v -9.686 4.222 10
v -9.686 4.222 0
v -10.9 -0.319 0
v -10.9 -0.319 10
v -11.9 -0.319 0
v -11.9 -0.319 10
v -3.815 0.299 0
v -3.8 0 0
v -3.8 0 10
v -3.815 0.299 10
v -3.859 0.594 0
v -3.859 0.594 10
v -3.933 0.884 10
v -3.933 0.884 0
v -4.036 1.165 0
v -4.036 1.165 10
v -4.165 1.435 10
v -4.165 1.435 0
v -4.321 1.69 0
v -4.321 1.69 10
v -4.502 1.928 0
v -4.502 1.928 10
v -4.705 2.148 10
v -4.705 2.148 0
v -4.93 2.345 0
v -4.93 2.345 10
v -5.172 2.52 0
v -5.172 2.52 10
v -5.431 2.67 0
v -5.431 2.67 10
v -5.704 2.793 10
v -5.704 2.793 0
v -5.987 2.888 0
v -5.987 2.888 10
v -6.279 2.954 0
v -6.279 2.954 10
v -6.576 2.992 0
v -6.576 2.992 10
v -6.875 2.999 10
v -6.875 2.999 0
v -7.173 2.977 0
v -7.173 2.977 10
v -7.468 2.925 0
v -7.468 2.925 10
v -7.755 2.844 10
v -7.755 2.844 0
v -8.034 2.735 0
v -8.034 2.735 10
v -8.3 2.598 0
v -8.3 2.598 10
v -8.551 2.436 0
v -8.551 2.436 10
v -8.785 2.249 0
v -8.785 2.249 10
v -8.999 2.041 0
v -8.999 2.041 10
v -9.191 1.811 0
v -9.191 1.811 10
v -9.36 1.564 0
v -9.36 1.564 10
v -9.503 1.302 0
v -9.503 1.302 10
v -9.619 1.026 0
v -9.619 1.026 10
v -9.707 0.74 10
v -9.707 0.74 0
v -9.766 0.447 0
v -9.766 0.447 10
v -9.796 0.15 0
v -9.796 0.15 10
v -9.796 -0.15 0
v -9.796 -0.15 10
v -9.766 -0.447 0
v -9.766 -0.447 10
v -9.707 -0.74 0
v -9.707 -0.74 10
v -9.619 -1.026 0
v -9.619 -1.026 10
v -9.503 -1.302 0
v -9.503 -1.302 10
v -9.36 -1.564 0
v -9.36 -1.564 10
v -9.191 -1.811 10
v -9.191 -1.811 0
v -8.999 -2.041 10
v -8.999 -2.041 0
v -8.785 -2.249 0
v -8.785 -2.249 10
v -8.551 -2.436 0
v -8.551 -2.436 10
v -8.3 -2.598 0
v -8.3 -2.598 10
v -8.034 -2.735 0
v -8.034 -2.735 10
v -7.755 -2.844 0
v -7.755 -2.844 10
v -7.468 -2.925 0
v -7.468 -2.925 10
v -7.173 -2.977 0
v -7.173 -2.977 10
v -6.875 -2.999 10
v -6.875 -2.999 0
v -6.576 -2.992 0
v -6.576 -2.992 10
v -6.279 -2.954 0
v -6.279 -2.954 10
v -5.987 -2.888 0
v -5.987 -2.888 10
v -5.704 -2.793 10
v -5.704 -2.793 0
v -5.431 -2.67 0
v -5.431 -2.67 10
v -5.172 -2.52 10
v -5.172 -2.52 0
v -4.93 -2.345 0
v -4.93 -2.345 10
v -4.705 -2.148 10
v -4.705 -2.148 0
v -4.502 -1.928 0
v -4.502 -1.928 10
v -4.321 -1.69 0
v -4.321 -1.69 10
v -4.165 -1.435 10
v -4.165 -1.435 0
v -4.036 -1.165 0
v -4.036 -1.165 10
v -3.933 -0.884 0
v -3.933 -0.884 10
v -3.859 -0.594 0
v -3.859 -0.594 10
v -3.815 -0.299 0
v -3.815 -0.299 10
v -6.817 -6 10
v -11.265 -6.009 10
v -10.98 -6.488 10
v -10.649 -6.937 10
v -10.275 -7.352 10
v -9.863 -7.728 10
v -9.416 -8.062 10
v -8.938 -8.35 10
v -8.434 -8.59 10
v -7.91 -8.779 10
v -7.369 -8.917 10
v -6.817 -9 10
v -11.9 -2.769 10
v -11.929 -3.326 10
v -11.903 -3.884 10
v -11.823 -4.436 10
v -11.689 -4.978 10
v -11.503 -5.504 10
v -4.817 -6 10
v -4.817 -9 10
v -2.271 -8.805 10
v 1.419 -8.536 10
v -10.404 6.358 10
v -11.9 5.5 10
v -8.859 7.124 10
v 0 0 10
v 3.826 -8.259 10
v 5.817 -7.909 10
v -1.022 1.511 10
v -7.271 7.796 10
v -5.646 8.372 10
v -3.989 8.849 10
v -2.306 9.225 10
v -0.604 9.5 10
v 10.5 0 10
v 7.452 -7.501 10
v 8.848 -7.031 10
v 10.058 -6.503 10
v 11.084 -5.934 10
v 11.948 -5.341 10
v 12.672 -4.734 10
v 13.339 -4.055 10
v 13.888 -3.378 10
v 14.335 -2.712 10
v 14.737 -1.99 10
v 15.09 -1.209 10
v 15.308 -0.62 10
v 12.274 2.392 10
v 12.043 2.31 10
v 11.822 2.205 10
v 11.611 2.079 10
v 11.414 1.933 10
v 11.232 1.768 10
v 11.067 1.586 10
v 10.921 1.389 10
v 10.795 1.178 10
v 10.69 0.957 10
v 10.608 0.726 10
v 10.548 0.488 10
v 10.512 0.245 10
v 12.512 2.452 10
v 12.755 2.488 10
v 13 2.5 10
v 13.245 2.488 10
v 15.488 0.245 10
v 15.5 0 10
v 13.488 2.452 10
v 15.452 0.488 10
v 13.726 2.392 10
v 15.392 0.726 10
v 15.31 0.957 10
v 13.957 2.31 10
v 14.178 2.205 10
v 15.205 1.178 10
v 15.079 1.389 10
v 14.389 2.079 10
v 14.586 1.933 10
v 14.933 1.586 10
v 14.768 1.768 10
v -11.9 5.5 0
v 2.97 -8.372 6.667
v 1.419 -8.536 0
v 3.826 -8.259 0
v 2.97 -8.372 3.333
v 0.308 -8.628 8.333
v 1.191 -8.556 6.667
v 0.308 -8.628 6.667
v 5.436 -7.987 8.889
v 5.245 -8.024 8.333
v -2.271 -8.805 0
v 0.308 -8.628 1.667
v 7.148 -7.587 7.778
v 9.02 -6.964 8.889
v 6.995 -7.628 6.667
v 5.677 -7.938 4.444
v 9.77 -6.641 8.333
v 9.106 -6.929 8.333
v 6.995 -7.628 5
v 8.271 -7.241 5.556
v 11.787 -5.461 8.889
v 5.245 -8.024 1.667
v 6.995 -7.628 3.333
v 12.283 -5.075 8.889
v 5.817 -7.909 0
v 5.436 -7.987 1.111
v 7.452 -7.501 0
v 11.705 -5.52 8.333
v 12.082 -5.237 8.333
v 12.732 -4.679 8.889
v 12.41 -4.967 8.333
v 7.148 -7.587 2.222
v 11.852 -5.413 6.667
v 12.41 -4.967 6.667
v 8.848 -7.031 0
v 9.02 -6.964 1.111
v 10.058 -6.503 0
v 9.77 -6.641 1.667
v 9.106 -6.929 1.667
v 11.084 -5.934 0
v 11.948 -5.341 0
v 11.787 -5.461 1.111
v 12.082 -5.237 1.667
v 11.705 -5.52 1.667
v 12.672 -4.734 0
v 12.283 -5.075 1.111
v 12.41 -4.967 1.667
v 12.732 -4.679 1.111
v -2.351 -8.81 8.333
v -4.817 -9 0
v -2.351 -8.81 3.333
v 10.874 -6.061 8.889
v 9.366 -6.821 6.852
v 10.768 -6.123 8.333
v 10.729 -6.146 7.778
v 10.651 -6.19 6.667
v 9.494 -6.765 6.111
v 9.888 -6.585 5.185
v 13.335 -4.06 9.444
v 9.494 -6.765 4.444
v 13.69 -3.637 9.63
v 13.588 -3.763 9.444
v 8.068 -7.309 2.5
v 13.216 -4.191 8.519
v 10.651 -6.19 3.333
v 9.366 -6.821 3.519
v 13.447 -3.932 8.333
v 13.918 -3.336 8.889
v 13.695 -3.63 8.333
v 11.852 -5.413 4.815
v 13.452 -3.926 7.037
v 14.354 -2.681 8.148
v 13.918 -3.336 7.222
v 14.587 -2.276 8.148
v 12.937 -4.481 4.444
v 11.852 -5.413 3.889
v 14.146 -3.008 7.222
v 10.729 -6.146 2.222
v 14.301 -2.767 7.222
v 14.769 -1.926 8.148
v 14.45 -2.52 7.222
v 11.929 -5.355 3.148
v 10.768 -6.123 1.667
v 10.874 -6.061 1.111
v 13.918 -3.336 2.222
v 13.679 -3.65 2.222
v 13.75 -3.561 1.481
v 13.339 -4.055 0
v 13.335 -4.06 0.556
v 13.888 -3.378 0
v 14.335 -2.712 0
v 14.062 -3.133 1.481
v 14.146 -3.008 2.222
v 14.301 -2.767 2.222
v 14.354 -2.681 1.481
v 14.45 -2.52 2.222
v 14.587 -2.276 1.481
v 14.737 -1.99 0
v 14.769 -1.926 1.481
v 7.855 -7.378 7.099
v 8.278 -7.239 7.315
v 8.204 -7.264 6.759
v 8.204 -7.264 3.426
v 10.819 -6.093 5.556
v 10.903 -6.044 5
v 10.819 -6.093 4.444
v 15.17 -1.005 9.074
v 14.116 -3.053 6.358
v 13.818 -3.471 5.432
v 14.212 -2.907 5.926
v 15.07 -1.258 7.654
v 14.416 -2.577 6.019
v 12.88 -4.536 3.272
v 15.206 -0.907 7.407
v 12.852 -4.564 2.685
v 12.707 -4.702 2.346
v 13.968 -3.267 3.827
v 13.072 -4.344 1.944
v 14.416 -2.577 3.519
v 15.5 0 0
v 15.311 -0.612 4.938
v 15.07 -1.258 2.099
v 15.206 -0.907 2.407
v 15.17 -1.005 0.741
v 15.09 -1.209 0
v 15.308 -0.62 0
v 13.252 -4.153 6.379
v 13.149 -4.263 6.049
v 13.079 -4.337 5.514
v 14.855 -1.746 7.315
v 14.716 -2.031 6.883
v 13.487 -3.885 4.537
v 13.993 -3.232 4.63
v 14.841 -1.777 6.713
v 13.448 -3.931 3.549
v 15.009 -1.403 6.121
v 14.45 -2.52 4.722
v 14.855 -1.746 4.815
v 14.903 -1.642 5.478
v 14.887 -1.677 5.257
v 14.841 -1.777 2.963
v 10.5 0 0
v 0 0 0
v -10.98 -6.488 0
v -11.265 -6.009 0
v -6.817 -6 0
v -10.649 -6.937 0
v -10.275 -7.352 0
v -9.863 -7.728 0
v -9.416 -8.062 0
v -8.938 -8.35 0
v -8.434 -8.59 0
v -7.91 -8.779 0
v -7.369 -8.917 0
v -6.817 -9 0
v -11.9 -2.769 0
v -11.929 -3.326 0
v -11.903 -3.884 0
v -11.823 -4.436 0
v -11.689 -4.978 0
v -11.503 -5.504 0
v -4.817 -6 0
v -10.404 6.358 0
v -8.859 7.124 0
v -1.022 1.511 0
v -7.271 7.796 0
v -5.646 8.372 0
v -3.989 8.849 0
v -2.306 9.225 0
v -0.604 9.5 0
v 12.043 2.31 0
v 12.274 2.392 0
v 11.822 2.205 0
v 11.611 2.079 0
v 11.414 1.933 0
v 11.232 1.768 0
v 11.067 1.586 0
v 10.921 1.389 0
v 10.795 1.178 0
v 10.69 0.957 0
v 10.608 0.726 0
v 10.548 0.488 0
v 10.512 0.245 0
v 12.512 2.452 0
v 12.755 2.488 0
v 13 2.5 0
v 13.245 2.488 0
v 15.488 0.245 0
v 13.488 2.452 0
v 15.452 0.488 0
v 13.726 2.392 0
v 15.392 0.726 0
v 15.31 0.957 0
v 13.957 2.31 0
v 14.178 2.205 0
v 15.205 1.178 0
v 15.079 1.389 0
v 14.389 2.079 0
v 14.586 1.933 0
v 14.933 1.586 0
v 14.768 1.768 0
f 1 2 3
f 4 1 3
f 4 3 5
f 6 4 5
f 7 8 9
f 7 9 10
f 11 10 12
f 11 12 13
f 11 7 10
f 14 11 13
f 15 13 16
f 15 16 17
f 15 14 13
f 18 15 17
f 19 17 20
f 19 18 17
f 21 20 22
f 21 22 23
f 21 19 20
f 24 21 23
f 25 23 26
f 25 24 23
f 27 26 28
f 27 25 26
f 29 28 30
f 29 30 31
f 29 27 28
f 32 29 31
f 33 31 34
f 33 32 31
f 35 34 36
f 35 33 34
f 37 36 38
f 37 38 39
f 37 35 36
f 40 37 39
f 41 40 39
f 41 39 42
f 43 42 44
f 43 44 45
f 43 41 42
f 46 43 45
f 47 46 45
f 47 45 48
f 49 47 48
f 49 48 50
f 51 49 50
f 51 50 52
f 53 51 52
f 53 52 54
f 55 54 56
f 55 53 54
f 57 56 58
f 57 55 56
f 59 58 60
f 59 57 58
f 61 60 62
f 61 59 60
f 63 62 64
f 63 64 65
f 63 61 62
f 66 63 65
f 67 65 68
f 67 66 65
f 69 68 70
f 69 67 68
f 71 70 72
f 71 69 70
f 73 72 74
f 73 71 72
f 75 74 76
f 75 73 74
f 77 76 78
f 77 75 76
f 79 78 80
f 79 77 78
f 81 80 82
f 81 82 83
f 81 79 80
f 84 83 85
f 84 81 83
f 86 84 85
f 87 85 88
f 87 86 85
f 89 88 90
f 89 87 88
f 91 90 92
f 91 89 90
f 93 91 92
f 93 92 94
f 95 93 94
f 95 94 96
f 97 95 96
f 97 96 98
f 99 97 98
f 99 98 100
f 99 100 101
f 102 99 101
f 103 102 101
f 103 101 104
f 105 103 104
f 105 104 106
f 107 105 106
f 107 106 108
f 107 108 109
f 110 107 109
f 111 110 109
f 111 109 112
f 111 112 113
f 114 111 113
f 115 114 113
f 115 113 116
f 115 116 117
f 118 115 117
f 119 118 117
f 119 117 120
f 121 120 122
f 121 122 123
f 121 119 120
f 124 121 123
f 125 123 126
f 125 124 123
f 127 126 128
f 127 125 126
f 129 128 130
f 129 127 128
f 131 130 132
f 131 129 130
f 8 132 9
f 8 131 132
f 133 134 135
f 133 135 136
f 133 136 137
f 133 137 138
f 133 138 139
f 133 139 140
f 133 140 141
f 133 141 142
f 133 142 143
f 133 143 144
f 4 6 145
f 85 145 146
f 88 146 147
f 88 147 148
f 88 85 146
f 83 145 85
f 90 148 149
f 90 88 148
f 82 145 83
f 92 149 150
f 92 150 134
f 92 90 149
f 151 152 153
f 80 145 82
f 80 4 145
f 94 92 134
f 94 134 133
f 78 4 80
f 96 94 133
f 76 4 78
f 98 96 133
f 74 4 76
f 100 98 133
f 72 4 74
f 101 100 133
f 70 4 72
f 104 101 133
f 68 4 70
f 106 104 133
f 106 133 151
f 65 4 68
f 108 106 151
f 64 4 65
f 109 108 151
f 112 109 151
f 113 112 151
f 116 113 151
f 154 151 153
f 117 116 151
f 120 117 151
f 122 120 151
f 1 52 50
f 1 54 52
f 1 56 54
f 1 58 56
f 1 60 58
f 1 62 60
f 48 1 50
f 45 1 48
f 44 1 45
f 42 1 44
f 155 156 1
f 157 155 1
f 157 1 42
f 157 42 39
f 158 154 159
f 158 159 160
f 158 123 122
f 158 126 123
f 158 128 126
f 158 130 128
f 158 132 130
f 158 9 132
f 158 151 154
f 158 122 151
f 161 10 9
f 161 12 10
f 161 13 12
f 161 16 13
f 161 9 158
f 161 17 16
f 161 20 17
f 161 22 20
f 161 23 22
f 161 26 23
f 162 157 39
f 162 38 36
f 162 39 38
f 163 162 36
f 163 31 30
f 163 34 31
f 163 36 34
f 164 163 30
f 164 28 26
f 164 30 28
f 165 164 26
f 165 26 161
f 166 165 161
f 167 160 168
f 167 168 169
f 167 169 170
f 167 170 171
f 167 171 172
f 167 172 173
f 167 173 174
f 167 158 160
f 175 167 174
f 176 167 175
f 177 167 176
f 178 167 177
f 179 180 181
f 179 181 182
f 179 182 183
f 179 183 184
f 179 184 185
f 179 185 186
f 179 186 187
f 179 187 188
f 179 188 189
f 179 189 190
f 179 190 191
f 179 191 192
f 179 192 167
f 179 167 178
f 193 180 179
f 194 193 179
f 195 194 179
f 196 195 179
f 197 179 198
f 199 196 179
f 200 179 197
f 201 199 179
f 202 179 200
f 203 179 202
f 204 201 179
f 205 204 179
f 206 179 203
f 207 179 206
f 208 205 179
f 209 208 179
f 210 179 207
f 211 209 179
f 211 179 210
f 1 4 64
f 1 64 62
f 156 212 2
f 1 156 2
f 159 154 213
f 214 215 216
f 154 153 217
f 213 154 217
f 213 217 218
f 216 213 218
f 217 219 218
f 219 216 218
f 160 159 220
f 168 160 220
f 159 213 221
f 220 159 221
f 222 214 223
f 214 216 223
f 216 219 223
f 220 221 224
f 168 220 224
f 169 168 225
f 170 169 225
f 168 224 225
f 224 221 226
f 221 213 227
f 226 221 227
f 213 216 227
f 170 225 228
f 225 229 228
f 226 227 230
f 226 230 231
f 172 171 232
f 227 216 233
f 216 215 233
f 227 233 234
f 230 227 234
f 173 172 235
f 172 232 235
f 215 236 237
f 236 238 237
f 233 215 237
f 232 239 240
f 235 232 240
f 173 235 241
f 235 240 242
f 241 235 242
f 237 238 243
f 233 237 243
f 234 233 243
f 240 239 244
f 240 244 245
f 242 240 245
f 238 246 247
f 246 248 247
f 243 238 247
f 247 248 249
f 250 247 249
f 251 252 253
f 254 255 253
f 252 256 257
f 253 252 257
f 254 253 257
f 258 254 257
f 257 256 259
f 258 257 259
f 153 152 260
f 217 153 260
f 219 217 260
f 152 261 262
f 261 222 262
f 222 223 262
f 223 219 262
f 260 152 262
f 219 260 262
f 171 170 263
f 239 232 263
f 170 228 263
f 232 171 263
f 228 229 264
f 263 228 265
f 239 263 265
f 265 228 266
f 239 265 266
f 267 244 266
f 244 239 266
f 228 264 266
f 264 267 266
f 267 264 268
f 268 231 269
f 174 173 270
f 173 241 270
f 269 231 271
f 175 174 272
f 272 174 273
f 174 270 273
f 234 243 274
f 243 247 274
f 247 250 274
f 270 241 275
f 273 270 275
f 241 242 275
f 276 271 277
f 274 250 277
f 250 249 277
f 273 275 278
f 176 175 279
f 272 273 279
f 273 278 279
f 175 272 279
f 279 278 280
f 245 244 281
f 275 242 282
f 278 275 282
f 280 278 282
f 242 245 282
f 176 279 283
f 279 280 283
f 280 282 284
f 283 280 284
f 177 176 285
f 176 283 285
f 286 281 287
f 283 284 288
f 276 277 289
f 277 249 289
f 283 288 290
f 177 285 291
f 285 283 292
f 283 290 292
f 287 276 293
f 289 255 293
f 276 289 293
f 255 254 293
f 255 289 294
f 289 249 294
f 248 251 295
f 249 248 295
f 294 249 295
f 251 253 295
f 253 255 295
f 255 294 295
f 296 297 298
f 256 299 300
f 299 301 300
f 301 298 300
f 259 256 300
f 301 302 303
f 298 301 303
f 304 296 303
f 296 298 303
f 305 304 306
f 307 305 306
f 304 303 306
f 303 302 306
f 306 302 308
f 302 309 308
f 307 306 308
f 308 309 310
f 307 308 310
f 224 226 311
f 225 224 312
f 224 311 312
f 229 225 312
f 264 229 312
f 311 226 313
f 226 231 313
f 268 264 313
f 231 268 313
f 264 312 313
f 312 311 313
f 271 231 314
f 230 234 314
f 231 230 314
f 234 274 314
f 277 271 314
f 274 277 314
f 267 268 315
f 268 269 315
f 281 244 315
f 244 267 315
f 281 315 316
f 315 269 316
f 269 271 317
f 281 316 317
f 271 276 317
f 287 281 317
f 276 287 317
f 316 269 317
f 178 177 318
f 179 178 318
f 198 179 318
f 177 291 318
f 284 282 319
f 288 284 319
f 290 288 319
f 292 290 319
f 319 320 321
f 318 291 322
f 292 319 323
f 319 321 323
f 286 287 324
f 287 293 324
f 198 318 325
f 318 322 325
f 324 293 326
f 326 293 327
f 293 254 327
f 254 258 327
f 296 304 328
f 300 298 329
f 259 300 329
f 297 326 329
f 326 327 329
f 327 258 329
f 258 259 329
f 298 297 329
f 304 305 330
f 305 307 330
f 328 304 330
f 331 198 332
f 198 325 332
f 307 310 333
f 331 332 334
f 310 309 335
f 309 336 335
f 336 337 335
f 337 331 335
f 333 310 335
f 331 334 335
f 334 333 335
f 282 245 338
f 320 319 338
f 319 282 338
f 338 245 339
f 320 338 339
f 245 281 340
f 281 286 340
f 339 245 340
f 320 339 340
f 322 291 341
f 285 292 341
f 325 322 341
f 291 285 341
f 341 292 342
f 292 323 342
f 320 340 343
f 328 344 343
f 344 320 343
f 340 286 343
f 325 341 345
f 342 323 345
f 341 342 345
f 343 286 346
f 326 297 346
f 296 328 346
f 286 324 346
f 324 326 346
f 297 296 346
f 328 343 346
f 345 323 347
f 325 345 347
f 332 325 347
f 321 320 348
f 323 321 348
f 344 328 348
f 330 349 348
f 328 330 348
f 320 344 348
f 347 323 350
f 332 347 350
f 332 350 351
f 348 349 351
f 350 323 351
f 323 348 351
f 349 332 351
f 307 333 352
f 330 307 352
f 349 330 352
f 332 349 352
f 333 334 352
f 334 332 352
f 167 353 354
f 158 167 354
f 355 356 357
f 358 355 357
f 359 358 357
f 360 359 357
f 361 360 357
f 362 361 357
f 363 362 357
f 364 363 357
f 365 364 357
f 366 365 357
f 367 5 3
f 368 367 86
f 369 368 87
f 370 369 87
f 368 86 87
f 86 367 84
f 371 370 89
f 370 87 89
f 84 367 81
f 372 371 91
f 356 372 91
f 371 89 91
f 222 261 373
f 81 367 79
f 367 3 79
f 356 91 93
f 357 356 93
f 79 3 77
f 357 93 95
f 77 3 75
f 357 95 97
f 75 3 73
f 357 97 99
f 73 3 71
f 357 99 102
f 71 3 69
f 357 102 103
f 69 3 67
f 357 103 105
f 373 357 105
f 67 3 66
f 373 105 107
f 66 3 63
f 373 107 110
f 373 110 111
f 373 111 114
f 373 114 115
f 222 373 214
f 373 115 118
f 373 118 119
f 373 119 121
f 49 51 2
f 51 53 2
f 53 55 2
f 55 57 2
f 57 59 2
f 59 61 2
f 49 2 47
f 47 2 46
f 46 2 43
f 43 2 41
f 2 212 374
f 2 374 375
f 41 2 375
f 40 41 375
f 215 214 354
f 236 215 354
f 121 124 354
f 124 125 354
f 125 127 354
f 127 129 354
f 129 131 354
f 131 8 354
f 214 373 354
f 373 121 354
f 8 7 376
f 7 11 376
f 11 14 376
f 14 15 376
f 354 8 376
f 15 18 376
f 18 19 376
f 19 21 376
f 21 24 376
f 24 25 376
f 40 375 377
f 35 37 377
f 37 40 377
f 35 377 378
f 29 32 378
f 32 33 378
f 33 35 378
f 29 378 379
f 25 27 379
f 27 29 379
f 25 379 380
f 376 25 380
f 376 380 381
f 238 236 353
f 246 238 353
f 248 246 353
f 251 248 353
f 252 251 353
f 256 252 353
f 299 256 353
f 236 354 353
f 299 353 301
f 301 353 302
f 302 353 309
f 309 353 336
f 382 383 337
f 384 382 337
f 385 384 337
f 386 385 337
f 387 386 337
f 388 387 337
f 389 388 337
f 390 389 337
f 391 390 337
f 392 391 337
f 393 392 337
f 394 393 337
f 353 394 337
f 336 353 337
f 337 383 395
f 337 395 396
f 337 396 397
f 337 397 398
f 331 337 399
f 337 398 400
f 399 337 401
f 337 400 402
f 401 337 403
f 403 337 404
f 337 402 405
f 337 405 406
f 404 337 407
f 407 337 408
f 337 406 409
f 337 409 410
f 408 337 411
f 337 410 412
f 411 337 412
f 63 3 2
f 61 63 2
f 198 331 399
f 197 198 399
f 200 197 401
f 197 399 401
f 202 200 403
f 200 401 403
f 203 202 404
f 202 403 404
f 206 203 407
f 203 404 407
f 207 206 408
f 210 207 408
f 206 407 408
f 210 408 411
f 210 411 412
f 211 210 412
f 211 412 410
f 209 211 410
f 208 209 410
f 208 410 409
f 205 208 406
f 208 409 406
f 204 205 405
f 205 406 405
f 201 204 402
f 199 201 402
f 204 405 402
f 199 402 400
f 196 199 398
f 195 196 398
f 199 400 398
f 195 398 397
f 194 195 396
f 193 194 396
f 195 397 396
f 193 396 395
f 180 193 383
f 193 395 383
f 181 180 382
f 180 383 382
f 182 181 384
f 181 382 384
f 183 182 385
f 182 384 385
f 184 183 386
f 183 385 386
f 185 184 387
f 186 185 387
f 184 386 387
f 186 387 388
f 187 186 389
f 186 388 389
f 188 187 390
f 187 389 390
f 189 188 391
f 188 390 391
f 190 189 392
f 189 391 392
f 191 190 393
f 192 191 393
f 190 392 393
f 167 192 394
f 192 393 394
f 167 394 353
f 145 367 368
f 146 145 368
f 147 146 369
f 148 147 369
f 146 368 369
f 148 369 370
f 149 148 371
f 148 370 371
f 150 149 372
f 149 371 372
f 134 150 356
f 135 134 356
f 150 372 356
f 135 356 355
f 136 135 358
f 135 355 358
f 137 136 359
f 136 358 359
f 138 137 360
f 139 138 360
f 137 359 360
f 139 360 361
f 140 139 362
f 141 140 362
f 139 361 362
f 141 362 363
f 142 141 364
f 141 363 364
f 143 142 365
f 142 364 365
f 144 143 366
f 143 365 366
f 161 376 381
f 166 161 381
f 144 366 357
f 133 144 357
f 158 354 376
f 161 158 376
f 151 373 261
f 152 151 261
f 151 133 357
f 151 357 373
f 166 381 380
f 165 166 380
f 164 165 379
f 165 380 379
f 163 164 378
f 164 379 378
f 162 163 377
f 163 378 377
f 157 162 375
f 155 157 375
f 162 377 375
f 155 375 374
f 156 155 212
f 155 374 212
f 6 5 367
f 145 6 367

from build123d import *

# Parameters (mm, degrees)
SKETCH1_R           = 3
BOSS_EXTRUDE1_DEPTH = 10


with BuildPart() as part:
    # Sketch1 → Boss-Extrude1 (new body)
    with BuildSketch(Plane.XY):
        with BuildLine():
            Line((10.5, 0), (0, 0))
            Line((0, 0), (-1.022323327, 1.510963722))
            Line((-1.022323327, 1.510963722), (-0.603635677, 9.5))
            ThreePointArc((-0.603635677, 9.5), (-6.462853921, 8.095985117), (-11.9, 5.5))
            Line((-11.9, 5.5), (-9.686017962, 4.221756874))
            Line((-9.686017962, 4.221756874), (-10.9, -0.318754948))
            Line((-10.9, -0.318754948), (-11.9, -0.318754948))
            Line((-11.9, -0.318754948), (-11.9, -2.769258551))
            ThreePointArc((-11.9, -2.769258551), (-10.648945281, -6.93734622), (-6.81703295, -9))
            Line((-6.81703295, -9), (-6.81703295, -6))
            Line((-6.81703295, -6), (-4.81703295, -6))
            Line((-4.81703295, -6), (-4.81703295, -9))
            add(Edge.make_bspline(
                [(-4.81703295, -9), (2.115225064, -8.331257602), (12.97604793, -9.010983468), (15.5, 0)],
                knots=[0.063235072, 0.063235072, 0.063235072, 0.063235072, 1.063235072, 1.063235072, 1.063235072, 1.063235072], degree=3))
            ThreePointArc((15.5, 0), (13, 2.5), (10.5, 0))
        make_face()
        with Locations((-6.8, 0)):
            Circle(SKETCH1_R, mode=Mode.SUBTRACT)
    extrude(amount=BOSS_EXTRUDE1_DEPTH)


solid = part.part
